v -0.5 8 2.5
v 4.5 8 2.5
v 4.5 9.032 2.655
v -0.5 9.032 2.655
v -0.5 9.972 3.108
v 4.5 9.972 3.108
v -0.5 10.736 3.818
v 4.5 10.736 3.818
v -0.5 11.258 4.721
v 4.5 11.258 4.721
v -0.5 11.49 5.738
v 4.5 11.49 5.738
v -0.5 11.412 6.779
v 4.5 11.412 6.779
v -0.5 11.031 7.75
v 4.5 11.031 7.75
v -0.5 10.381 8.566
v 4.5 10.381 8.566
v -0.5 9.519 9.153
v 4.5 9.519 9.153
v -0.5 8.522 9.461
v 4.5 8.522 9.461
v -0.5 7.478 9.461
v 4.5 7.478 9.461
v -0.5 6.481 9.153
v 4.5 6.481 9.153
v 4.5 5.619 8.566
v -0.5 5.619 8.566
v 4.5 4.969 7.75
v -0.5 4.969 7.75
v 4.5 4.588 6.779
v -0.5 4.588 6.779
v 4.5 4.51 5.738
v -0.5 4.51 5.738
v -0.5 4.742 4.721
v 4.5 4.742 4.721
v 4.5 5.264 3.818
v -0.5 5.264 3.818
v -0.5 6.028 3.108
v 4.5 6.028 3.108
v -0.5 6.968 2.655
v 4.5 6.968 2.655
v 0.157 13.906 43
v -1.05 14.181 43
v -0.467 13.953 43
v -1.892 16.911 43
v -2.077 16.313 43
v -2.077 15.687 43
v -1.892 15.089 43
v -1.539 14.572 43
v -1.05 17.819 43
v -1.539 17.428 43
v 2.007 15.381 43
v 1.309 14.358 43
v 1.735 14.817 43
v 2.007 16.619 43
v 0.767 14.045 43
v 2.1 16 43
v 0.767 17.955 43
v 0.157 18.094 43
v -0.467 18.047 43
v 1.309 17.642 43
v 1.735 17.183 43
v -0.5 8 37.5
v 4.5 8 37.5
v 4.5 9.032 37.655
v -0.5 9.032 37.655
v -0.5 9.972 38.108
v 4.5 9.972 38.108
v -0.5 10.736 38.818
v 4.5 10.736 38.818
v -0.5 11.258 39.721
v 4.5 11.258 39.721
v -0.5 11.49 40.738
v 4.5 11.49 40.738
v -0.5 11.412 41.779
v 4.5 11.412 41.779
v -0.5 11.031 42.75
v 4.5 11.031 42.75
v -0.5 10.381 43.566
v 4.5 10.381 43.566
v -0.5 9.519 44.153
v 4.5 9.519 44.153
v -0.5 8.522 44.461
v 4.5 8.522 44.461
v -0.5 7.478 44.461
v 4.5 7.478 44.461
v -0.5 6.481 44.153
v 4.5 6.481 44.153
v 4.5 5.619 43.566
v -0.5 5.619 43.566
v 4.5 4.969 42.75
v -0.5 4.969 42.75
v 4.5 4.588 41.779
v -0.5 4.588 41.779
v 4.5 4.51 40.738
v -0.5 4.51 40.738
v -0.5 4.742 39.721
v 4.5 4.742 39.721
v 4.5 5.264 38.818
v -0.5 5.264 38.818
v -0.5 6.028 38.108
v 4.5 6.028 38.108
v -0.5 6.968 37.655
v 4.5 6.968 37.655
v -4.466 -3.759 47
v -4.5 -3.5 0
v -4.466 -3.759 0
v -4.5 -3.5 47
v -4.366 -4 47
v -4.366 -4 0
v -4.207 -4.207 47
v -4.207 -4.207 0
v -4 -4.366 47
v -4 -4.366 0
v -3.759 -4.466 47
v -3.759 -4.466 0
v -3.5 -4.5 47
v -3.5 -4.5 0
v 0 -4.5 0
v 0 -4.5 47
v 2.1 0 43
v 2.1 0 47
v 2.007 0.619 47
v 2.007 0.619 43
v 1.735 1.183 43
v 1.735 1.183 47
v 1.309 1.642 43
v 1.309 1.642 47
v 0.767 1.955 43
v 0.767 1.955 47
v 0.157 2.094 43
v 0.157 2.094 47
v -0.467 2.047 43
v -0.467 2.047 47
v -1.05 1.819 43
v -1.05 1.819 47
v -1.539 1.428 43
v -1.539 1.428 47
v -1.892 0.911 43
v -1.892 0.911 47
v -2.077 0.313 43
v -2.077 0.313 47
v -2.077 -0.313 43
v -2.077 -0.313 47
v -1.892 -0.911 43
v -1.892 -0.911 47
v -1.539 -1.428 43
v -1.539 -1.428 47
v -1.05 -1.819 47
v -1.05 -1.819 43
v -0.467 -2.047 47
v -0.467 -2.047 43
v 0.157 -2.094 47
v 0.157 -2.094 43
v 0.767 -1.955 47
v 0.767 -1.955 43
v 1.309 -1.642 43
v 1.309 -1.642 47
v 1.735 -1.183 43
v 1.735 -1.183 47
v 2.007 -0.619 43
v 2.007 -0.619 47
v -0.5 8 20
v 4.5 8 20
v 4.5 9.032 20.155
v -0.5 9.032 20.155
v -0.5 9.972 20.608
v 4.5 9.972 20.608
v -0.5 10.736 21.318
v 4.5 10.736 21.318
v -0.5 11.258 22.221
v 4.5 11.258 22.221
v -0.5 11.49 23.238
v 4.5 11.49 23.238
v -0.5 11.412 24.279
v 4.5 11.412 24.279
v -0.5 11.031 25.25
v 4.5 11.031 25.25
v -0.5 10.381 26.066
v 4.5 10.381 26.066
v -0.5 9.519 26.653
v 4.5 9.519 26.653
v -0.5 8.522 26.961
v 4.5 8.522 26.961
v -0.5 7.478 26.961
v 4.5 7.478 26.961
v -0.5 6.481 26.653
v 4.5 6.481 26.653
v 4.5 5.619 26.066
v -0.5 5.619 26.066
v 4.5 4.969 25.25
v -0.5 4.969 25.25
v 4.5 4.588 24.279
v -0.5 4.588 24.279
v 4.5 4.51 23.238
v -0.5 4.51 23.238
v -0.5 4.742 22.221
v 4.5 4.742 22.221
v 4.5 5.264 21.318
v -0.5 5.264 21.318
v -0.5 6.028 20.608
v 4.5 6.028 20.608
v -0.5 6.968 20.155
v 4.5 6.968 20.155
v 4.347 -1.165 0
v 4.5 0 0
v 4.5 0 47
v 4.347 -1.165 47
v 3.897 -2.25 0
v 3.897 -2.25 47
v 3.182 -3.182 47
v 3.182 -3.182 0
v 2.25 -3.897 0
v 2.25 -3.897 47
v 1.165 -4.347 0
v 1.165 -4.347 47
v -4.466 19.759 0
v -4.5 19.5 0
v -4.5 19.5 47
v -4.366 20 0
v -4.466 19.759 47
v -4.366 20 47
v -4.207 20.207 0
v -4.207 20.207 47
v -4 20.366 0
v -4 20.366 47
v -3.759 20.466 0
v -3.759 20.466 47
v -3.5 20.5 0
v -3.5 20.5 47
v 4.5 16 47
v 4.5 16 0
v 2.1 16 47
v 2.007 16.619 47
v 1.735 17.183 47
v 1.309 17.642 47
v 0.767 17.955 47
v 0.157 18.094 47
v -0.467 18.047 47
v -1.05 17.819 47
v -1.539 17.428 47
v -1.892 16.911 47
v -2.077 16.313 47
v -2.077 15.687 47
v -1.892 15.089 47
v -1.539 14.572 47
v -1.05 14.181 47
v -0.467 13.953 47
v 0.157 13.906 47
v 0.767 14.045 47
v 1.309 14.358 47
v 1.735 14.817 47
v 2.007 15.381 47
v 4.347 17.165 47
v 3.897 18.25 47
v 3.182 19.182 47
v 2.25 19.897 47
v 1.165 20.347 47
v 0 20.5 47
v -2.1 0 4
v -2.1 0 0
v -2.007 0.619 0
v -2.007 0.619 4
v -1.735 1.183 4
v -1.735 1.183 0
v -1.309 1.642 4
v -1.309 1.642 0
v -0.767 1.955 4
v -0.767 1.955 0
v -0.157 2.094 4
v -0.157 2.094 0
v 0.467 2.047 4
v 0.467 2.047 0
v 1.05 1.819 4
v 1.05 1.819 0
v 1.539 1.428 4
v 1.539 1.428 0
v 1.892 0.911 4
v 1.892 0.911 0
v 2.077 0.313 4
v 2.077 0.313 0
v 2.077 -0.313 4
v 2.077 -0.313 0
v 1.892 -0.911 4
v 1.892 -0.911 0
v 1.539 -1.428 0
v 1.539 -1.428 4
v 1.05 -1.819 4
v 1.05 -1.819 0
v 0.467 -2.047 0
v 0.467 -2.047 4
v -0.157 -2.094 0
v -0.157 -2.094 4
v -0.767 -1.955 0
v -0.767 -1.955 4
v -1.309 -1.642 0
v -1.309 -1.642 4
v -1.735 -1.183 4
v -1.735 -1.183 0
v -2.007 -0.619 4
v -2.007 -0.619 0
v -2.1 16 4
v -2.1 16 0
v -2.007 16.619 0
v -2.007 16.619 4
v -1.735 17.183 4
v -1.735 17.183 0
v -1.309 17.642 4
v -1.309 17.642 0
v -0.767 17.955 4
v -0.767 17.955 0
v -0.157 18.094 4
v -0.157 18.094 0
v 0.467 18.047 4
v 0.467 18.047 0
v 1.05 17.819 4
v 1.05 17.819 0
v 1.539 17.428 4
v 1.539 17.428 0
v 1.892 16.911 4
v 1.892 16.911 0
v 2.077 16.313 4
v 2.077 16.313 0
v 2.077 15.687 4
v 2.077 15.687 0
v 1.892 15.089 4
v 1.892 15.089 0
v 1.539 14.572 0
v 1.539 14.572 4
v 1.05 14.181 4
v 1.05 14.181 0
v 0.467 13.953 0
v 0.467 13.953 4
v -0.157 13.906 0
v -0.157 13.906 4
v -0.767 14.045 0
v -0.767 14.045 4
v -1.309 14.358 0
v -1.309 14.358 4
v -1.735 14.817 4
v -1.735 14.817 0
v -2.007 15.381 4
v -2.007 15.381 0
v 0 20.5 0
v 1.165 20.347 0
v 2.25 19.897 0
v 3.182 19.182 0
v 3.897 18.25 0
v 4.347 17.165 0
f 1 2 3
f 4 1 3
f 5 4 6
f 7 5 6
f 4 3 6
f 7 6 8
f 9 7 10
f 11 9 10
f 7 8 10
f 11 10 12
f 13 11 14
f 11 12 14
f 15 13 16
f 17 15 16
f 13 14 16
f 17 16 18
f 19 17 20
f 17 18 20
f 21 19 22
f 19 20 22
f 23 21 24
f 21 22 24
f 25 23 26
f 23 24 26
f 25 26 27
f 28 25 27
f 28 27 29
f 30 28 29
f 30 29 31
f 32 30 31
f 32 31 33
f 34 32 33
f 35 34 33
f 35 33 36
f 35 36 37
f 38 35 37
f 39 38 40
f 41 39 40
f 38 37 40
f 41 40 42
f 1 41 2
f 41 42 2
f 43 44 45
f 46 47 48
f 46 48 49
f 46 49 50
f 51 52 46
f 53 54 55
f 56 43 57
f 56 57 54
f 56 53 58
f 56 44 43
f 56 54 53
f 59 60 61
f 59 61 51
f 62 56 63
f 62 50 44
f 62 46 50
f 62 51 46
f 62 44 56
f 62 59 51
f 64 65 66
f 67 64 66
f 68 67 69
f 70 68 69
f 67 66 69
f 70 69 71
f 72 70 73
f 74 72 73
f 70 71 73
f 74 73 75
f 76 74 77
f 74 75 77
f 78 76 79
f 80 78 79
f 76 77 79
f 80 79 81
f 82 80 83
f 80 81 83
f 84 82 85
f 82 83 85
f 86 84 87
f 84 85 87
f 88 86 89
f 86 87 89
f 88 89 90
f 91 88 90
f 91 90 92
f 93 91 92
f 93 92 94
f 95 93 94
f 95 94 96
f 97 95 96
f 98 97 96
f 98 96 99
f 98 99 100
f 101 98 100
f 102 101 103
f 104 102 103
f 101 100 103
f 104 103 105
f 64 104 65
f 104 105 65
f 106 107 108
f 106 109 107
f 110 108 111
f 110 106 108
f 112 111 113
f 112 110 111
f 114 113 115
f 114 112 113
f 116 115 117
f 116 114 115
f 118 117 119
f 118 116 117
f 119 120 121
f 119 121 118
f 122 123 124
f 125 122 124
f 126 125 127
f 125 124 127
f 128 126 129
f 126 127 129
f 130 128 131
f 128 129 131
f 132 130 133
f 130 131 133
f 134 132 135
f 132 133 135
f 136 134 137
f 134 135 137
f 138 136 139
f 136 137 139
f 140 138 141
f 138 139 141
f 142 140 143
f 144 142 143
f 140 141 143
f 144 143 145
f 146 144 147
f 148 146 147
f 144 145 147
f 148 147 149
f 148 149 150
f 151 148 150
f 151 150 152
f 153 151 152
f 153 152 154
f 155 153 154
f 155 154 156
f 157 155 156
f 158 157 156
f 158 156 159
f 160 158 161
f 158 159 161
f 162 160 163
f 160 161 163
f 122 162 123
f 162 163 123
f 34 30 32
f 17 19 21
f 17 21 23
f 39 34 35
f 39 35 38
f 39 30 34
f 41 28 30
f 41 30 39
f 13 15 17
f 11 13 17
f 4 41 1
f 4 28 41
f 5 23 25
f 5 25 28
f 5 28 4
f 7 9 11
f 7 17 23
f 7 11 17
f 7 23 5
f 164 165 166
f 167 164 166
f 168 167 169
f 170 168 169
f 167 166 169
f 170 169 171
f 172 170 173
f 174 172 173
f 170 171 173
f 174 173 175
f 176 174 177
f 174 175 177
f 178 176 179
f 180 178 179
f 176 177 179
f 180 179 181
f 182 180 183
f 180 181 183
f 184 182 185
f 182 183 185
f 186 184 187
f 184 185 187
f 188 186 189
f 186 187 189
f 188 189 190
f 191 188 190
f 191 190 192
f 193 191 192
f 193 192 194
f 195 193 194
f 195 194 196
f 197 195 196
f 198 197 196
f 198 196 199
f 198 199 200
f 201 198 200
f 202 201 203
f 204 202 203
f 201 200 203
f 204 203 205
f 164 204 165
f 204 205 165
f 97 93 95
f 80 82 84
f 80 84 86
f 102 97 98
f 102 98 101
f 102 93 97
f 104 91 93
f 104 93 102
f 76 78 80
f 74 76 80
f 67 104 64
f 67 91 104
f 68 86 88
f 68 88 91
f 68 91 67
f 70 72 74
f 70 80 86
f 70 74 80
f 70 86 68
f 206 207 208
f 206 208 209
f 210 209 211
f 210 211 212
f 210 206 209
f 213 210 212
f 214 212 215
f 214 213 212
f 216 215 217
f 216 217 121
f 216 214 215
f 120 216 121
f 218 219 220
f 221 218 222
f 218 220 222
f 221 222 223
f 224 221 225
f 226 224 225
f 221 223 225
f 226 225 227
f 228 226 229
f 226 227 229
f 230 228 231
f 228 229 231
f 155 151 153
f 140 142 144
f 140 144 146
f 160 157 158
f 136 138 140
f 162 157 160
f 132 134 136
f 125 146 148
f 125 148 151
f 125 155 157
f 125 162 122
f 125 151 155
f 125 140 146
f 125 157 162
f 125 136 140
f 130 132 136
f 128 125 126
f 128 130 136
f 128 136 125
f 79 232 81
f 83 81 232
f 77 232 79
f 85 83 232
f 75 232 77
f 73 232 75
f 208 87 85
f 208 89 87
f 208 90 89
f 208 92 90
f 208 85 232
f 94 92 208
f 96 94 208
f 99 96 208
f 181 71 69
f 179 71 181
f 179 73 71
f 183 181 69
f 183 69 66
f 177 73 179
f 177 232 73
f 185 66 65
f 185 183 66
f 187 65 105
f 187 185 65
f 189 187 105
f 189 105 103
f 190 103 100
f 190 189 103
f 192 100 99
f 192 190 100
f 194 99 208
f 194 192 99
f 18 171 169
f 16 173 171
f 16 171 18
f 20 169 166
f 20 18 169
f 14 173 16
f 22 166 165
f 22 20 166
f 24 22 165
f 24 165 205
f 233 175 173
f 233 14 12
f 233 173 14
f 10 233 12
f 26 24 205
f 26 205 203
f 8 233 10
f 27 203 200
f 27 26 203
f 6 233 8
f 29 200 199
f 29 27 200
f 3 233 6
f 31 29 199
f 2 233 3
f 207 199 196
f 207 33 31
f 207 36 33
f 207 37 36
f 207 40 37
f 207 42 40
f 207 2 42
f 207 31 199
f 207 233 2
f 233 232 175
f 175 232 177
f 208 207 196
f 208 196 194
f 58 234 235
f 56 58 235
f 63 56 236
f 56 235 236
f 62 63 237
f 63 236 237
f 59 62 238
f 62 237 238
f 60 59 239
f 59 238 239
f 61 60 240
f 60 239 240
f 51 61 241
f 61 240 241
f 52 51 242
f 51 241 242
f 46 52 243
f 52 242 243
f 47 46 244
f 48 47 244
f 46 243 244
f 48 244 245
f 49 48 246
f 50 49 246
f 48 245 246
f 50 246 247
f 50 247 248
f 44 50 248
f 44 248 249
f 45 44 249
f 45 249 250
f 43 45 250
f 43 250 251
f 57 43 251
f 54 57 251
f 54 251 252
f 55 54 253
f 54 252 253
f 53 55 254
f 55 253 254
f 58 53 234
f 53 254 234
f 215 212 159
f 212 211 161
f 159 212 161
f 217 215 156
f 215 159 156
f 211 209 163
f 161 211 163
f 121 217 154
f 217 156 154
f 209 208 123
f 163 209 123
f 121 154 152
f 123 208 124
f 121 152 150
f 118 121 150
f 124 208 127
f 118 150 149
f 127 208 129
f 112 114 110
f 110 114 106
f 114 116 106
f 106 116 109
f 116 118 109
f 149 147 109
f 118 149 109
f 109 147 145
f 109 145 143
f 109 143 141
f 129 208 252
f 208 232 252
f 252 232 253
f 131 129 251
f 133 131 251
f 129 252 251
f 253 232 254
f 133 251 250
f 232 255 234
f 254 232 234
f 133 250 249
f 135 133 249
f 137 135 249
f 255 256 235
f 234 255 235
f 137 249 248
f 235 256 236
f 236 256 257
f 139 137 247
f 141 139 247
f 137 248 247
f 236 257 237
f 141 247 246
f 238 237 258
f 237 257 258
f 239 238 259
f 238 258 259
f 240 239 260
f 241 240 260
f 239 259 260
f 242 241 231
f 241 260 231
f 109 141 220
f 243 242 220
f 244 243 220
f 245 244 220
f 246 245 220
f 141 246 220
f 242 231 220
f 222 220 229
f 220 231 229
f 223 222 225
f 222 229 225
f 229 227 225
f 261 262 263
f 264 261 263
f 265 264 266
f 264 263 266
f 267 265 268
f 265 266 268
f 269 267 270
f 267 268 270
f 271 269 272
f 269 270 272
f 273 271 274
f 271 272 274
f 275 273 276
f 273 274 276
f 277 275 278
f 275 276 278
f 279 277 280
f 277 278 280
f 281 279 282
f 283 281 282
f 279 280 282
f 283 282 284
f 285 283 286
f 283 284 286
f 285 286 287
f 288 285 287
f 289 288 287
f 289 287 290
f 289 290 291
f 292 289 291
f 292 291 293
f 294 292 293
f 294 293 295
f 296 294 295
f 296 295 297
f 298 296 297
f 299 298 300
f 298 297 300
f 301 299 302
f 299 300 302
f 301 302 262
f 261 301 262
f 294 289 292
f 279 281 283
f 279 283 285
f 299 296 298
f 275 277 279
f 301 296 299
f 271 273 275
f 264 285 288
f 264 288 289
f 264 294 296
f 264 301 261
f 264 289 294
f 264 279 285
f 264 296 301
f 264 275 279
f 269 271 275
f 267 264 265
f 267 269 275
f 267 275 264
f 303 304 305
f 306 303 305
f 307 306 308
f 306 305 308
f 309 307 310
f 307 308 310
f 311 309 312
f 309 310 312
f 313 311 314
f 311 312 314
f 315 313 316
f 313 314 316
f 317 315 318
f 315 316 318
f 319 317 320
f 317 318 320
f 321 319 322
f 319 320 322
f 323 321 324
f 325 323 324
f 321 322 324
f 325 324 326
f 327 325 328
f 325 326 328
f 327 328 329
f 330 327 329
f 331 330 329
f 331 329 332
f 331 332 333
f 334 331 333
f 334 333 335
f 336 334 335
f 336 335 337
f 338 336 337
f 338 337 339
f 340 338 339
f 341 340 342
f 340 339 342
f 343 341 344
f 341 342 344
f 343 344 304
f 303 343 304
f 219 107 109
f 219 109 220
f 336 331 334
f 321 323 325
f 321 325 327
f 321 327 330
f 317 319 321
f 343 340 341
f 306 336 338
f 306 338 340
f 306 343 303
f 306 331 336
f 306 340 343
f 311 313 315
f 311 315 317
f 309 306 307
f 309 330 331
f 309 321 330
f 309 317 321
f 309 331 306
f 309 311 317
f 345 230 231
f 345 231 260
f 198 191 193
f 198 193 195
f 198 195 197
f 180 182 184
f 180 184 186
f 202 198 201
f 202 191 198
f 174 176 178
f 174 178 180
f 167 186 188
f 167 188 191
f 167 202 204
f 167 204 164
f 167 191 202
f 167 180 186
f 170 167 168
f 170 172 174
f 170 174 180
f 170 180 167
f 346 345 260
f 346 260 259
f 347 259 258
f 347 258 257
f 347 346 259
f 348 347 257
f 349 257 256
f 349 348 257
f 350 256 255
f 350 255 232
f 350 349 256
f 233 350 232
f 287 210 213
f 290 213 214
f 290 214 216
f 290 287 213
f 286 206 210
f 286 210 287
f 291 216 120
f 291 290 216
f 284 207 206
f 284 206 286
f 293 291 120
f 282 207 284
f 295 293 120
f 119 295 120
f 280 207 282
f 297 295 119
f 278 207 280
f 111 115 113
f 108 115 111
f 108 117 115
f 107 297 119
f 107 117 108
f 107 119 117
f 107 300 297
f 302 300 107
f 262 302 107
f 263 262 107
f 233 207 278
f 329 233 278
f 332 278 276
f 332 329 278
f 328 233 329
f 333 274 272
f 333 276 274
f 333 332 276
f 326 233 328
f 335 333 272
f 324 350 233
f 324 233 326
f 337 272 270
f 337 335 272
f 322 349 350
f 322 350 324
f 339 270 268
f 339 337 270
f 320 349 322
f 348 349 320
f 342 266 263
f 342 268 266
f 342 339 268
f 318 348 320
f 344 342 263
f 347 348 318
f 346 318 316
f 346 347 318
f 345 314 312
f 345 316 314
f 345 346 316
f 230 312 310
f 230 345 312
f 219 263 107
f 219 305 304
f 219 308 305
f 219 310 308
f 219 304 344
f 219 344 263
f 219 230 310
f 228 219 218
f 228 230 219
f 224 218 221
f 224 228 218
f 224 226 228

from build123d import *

# Parameters (mm, degrees)
BOSS_EXTRUDE1_DEPTH = 47
SKETCH2_R           = 2.1
CUT_EXTRUDE1_DEPTH  = 4
SKETCH3_R           = 2.1
CUT_EXTRUDE2_DEPTH  = 4
SKETCH4_R           = 3.5
CUT_EXTRUDE3_DEPTH  = 5
FILLET1_R           = 1


with BuildPart() as part:
    # Sketch1 → Boss-Extrude1 (new body)
    with BuildSketch(Plane.XY):
        with BuildLine():
            Line((-4.5, -4.5), (-4.5, 20.5))
            Line((-4.5, 20.5), (0, 20.5))
            ThreePointArc((0, 20.5), (3.181980515, 19.181980515), (4.5, 16))
            Line((4.5, 16), (4.5, 0))
            ThreePointArc((4.5, 0), (3.181980515, -3.181980515), (0, -4.5))
            Line((0, -4.5), (-4.5, -4.5))
        make_face()
    extrude(amount=BOSS_EXTRUDE1_DEPTH)

    # Sketch2 → Cut-Extrude1 (cut)
    with BuildSketch(Plane.XY.offset(47)):
        with Locations((0, 16)):
            Circle(SKETCH2_R)
        Circle(SKETCH2_R)
    extrude(amount=-CUT_EXTRUDE1_DEPTH, mode=Mode.SUBTRACT)

    # Sketch3 → Cut-Extrude2 (cut)
    with BuildSketch(Plane(origin=(0, 0, 0), x_dir=(-1, 0, 0), z_dir=(0, 0, -1))):
        Circle(SKETCH3_R)
        with Locations((0, 16)):
            Circle(SKETCH3_R)
    extrude(amount=-CUT_EXTRUDE2_DEPTH, mode=Mode.SUBTRACT)

    # Sketch4 → Cut-Extrude3 (cut)
    with BuildSketch(Plane(origin=(4.5, 0, 0), x_dir=(0, 0, -1), z_dir=(1, 0, 0))):
        with Locations((-41, 8)):
            Circle(SKETCH4_R)
        with Locations((-23.5, 8)):
            Circle(SKETCH4_R)
        with Locations((-6, 8)):
            Circle(SKETCH4_R)
    extrude(amount=-CUT_EXTRUDE3_DEPTH, mode=Mode.SUBTRACT)

    # Fillet1
    fillet1_edges = [part.edges().sort_by_distance(p)[0] for p in [
        (-4.5, -4.5, 23.5),
        (-4.5, 20.5, 23.5),
    ]]
    fillet(fillet1_edges, radius=FILLET1_R)


solid = part.part
